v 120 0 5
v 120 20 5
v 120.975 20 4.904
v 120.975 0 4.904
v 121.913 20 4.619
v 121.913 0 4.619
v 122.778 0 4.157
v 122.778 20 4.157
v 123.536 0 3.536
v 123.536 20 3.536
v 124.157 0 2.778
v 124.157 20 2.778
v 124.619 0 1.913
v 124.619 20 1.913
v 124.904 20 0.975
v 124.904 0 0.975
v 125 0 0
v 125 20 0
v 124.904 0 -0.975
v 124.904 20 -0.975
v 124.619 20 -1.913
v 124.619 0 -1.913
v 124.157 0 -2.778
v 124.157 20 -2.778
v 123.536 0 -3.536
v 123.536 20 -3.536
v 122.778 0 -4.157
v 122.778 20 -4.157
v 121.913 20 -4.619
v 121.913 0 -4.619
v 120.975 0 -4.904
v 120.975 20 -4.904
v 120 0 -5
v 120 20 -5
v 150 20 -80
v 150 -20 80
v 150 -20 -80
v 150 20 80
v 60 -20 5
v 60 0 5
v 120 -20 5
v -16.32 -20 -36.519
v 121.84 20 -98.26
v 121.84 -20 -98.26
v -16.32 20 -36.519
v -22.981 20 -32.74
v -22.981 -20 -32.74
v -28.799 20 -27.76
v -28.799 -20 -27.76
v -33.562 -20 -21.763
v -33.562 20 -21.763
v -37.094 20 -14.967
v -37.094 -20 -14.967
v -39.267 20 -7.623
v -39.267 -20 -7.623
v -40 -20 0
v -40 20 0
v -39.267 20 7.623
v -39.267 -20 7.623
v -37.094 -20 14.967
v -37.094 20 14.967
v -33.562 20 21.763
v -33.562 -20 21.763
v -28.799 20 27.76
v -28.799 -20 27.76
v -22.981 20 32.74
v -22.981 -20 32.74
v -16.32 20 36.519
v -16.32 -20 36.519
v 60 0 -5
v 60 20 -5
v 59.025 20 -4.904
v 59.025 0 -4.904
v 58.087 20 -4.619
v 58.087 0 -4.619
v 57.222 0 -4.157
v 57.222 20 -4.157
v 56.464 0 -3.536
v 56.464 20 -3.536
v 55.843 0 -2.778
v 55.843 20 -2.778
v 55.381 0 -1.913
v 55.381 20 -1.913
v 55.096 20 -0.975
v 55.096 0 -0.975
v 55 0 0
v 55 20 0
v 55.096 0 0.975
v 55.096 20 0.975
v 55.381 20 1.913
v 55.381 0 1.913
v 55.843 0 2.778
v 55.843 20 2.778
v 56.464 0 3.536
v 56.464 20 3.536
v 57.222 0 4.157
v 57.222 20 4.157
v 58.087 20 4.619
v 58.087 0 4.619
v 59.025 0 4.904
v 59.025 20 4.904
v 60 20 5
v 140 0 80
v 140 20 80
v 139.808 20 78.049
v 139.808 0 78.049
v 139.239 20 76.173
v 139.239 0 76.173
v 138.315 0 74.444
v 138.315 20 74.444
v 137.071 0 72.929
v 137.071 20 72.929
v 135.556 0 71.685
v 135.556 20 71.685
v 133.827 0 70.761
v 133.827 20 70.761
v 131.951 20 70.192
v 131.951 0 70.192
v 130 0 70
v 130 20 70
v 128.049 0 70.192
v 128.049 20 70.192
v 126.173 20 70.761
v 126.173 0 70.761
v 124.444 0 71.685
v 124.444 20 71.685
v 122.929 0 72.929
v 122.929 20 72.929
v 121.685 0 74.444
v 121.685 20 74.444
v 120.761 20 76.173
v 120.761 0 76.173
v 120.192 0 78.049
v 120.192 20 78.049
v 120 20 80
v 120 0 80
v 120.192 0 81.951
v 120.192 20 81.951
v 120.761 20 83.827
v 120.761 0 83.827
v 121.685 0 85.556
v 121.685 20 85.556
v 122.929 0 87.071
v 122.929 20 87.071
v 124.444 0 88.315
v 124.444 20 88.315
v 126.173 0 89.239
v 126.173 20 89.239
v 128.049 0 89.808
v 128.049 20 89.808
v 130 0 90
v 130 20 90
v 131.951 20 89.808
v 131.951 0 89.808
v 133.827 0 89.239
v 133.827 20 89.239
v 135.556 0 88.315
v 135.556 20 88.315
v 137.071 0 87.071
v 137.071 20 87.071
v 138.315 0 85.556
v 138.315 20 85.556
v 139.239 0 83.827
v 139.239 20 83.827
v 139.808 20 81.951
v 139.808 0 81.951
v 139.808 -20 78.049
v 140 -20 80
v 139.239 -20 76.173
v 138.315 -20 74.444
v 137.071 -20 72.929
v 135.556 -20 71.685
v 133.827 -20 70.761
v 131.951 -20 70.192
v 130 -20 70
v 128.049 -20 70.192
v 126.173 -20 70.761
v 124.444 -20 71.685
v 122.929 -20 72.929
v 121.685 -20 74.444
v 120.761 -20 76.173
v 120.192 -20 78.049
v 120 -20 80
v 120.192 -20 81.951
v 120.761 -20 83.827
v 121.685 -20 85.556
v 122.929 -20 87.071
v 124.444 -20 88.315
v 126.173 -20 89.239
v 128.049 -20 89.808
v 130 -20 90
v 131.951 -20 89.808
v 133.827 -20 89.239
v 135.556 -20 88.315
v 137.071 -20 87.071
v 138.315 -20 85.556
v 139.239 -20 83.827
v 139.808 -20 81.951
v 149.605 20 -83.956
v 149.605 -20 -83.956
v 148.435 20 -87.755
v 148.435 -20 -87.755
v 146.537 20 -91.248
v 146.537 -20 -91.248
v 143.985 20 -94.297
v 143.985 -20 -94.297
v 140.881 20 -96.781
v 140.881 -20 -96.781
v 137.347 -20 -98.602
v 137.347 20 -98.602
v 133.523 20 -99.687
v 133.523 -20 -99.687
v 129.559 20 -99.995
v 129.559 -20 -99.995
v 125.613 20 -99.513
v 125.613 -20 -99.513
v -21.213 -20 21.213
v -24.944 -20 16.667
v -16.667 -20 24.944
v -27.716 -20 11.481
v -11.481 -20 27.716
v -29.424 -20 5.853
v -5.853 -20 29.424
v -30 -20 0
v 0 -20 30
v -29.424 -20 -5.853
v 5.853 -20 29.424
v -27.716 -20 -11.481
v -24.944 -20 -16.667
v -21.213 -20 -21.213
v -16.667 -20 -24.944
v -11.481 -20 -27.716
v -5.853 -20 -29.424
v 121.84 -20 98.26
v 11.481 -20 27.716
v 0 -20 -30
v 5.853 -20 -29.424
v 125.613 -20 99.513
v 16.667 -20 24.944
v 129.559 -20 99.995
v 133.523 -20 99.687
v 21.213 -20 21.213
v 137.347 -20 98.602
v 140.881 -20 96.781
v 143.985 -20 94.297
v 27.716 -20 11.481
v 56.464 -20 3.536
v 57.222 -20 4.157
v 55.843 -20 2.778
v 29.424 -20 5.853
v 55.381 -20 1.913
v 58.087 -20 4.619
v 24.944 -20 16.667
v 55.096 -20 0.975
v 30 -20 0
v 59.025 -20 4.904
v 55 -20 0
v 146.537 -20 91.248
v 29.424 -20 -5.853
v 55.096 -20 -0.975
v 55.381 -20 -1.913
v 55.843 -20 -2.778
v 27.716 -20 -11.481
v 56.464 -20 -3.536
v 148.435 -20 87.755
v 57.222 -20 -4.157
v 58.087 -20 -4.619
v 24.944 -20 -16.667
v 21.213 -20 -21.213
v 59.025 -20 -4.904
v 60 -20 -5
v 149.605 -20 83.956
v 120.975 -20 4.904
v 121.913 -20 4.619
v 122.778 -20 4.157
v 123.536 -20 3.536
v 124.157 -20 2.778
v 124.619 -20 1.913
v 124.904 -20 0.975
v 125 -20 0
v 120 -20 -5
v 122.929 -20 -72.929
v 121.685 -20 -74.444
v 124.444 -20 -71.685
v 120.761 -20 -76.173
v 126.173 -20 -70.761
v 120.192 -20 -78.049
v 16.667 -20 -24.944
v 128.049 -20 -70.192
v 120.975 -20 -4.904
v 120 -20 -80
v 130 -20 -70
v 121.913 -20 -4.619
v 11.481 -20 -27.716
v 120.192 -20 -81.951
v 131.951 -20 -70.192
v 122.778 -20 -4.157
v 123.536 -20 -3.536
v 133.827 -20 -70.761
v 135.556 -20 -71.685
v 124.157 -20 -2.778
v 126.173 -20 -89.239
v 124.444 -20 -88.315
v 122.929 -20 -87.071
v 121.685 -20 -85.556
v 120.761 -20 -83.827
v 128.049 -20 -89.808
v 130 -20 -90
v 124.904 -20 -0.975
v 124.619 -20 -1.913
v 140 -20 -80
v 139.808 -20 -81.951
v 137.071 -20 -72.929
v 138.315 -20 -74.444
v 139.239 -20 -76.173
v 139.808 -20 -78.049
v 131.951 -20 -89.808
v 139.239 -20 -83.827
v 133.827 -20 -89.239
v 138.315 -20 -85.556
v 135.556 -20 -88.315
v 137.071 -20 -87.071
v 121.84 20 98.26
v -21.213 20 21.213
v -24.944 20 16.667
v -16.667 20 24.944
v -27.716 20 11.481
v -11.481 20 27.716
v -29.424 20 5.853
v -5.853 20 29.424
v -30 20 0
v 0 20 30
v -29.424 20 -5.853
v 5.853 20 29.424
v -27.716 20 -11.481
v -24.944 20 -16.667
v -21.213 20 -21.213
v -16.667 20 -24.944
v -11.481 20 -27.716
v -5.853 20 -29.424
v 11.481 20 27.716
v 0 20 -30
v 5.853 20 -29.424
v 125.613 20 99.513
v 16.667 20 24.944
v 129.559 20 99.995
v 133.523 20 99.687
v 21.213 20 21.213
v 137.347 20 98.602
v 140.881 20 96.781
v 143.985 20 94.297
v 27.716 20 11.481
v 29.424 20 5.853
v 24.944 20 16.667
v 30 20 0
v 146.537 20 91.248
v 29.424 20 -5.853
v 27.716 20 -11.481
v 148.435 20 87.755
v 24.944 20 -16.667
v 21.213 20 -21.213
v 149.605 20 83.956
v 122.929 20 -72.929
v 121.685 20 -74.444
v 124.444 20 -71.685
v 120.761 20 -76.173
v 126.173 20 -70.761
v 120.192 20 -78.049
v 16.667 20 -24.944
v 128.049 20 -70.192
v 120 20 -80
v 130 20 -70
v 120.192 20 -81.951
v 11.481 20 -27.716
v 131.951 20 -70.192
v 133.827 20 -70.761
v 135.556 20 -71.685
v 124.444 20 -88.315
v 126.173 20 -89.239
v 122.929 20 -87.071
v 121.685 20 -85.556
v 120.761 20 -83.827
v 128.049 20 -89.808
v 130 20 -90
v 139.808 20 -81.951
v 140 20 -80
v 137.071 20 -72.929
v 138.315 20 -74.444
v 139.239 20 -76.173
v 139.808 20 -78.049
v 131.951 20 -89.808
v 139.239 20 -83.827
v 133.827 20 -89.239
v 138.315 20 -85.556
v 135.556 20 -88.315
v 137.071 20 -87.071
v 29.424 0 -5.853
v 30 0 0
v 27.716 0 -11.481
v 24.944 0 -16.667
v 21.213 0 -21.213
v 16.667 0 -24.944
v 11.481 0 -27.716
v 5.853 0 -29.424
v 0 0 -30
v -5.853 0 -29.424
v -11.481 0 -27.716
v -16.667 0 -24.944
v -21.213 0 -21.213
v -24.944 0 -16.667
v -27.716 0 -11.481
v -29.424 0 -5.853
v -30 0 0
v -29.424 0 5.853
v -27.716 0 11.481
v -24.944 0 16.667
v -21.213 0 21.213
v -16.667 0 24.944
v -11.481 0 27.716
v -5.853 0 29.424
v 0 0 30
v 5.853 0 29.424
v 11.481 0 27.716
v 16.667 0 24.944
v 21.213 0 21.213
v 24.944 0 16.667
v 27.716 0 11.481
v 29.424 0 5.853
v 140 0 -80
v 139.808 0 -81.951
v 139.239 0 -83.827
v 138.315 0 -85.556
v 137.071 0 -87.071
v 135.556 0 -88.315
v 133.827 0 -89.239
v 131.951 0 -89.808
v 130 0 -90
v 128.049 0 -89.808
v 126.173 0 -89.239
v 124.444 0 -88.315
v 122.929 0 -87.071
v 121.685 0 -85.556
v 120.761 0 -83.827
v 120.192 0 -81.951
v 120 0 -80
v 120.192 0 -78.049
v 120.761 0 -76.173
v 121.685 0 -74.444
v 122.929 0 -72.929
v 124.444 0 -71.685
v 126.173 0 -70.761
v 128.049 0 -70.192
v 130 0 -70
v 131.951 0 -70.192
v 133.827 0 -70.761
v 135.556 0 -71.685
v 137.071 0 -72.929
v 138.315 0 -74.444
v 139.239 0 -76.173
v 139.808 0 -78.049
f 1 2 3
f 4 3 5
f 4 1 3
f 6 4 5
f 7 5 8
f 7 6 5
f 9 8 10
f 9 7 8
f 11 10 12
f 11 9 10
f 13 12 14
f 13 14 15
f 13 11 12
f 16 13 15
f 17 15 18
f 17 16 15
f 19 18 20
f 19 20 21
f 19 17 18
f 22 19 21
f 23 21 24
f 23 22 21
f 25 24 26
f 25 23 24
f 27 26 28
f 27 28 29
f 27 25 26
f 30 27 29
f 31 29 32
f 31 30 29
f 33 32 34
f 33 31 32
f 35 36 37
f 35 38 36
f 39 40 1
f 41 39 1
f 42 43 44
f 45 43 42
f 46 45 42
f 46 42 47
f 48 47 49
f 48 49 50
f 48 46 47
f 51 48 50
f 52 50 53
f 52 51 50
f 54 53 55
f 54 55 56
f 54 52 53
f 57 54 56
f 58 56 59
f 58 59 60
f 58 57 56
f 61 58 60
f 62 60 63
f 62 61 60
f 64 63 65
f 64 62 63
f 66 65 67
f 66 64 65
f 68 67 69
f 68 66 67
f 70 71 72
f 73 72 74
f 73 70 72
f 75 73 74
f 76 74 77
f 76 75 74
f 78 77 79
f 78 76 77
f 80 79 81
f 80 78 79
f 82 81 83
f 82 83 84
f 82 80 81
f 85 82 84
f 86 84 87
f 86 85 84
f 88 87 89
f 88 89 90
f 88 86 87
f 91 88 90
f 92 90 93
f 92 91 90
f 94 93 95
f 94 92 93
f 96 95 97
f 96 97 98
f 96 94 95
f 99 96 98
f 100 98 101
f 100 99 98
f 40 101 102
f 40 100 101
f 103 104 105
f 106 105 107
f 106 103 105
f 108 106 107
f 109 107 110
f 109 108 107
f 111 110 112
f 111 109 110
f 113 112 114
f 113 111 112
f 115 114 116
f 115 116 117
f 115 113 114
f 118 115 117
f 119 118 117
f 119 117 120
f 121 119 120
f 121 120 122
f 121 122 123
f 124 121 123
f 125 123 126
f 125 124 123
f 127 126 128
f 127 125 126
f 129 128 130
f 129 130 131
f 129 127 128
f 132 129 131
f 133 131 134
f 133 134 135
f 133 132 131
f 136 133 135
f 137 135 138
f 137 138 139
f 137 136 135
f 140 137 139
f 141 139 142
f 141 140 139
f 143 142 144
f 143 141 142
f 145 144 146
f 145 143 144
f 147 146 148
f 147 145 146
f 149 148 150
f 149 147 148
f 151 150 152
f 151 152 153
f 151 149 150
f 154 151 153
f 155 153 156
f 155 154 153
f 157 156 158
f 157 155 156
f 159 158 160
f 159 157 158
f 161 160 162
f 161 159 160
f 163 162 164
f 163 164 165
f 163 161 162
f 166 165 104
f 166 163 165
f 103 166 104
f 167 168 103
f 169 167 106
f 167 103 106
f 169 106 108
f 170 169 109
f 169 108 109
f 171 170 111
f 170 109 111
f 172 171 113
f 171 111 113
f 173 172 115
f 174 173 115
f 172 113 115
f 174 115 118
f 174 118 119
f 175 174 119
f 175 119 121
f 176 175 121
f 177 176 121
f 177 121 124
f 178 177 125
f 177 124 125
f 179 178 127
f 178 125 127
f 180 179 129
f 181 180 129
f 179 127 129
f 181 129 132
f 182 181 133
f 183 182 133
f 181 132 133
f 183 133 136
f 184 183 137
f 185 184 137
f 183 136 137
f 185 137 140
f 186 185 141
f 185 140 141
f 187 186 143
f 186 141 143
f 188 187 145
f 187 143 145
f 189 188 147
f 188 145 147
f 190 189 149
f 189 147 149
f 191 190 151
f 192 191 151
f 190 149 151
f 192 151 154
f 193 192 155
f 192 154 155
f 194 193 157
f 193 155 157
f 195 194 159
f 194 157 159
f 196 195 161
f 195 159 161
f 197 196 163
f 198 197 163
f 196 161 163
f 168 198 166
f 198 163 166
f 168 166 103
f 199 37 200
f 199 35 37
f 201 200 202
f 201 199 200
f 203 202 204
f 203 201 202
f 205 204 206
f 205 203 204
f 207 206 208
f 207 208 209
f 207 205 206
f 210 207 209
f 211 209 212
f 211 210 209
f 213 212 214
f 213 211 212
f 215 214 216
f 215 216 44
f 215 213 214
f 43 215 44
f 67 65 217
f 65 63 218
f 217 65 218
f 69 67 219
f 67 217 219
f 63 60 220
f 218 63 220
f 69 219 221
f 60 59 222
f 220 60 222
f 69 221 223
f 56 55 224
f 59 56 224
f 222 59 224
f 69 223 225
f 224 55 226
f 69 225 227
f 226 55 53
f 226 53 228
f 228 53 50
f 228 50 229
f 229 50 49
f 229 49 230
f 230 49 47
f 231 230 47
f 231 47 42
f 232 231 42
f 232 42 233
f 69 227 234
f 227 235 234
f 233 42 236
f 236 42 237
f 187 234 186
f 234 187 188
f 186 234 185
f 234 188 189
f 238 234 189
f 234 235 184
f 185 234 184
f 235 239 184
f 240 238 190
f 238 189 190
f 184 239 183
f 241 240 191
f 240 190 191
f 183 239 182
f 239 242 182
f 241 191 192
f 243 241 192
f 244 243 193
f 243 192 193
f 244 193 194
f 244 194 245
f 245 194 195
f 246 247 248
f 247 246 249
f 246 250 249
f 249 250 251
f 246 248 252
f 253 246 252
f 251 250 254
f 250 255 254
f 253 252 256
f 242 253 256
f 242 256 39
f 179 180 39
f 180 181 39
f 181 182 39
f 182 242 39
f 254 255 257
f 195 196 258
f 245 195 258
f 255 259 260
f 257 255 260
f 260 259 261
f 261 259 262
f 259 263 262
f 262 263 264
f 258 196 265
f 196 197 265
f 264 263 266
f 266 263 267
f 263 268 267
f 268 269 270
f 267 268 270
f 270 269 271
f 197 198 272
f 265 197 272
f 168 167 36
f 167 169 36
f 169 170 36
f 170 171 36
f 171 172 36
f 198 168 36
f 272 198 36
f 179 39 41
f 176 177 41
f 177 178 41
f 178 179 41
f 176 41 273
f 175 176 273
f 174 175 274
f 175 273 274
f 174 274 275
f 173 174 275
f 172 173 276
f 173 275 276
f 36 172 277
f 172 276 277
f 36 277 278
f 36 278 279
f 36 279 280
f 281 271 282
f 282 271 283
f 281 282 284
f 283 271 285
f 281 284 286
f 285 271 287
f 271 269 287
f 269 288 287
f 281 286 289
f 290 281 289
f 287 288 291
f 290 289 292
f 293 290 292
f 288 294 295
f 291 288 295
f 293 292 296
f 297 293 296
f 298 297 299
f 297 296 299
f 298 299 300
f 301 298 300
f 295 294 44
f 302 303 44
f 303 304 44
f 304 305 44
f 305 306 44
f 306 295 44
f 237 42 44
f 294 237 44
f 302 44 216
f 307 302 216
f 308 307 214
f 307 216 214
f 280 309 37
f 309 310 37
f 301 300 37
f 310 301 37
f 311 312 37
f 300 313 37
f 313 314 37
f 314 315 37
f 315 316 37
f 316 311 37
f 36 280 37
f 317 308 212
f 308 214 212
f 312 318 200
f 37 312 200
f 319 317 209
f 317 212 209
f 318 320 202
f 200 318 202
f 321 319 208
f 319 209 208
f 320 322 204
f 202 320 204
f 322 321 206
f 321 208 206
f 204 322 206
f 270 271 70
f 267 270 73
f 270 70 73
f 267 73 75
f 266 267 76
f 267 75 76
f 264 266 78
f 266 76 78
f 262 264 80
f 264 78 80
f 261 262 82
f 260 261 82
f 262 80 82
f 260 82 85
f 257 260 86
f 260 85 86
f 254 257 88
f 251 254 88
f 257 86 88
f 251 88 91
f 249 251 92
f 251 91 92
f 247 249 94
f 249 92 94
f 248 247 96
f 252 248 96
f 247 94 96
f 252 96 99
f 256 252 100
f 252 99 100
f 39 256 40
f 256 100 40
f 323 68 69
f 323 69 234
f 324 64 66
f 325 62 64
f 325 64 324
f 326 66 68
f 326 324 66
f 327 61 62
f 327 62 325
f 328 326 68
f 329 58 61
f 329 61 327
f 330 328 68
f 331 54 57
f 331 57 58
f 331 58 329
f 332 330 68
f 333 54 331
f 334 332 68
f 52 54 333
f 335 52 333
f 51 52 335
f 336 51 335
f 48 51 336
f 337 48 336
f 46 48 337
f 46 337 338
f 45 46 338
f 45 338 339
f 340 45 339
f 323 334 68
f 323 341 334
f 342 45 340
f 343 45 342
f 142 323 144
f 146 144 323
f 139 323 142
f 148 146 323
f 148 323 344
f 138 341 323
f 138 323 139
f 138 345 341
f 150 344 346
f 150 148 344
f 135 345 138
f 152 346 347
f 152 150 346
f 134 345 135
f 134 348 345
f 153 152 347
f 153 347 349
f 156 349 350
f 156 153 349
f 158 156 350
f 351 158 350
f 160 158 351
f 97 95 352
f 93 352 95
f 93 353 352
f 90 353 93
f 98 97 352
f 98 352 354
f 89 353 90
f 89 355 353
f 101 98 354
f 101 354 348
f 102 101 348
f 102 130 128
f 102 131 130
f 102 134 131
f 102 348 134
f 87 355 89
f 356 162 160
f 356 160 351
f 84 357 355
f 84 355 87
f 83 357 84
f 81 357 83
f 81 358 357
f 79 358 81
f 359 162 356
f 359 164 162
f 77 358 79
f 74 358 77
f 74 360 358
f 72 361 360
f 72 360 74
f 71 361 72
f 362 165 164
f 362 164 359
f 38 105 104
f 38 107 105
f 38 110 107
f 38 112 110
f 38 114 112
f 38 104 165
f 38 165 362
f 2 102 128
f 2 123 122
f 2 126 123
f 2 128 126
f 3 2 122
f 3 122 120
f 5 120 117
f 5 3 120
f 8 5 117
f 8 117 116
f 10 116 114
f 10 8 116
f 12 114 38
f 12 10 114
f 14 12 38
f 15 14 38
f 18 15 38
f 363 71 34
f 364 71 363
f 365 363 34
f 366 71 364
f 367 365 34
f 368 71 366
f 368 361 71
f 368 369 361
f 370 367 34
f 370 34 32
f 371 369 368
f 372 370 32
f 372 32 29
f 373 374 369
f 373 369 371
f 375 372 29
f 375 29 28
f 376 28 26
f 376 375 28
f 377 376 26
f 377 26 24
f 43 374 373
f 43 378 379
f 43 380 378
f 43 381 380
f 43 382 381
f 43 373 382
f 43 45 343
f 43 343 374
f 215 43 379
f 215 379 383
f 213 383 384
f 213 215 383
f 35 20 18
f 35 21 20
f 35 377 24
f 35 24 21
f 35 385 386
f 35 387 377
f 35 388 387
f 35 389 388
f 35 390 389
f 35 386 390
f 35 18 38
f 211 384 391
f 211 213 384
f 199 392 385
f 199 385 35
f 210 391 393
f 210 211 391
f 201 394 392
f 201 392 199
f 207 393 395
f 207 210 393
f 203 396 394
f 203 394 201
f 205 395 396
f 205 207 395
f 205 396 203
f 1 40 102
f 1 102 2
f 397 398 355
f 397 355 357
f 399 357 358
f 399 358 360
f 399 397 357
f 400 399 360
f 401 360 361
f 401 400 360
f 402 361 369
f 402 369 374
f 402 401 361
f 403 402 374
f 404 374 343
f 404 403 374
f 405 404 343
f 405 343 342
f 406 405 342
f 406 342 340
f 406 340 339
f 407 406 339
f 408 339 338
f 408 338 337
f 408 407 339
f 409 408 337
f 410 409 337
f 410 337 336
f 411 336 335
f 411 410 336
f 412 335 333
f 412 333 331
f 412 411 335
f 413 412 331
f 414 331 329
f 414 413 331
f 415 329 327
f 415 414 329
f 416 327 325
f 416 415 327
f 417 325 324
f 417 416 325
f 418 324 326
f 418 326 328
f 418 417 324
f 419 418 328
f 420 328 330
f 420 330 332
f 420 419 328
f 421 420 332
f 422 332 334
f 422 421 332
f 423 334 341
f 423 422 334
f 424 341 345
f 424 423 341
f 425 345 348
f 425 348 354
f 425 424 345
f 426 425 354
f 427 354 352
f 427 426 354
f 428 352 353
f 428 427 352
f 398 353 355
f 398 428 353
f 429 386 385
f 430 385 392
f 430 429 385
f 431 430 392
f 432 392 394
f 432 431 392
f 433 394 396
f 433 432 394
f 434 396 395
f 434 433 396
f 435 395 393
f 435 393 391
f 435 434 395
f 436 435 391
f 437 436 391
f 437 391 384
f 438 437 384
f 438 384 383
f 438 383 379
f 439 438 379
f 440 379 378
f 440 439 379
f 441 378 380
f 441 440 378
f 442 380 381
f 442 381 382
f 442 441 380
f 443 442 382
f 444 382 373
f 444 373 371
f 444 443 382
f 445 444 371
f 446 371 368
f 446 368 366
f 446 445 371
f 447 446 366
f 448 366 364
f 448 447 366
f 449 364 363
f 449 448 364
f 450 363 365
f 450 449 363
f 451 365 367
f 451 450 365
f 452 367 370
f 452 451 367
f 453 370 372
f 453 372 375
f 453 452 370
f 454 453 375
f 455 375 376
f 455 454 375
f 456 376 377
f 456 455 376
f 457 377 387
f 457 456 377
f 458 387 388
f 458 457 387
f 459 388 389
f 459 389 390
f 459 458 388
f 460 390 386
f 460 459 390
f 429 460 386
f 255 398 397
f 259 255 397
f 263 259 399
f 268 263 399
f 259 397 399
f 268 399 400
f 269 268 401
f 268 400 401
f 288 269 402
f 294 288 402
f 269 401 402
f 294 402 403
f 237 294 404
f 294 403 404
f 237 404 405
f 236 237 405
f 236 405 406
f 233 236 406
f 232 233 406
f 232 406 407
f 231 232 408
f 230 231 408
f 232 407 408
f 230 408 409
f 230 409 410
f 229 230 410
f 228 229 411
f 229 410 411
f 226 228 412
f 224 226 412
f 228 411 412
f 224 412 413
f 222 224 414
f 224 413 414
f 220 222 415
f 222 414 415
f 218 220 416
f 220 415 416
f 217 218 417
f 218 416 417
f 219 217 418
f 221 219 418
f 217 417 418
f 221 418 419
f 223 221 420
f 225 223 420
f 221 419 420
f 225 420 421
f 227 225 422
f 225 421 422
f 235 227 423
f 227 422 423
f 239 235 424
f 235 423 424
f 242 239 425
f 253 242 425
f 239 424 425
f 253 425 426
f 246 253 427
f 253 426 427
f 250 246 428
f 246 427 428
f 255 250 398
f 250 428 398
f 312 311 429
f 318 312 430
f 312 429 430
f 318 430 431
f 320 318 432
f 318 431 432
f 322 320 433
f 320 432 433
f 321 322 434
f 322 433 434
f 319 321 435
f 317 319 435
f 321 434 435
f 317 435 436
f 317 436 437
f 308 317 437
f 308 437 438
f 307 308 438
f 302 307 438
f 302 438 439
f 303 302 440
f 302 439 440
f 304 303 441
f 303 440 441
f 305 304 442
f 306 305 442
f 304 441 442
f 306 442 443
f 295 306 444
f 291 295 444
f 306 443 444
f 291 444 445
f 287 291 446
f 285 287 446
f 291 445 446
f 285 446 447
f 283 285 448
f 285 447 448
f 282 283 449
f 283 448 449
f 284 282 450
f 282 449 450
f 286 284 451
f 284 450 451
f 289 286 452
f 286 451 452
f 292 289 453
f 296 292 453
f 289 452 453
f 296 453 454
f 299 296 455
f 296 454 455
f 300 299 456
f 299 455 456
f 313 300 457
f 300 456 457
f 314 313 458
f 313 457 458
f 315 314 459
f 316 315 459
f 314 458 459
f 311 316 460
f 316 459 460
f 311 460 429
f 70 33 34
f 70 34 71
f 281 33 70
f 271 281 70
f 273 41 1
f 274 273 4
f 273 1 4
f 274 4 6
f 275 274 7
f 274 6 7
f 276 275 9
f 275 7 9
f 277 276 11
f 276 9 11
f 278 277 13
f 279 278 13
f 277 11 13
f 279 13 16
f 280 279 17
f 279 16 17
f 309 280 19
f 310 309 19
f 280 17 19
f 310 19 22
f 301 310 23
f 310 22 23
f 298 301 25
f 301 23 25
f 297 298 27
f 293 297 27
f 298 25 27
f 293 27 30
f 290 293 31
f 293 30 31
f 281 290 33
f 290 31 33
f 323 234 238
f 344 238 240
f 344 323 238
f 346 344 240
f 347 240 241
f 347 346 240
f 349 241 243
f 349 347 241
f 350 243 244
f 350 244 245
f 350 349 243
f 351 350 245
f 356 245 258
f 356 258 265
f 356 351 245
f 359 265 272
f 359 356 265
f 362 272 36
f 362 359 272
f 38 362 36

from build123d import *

# Parameters (mm, degrees)
BOSS_EXTRUDE1_DEPTH      = 20
BOSS_EXTRUDE1_DEPTH_BACK = 20
SKETCH1_R                = 30
SKETCH1_R_2              = 10


with BuildPart() as part:
    # Sketch1 → Boss-Extrude1 (new, two sides: drawn at the far end of the back side and taken through both)
    with BuildSketch(Plane(origin=(0, 0, 0), x_dir=(1, 0, 0), z_dir=(0, 1, 0)).offset(-BOSS_EXTRUDE1_DEPTH_BACK)):
        with BuildLine():
            Line((121.840174455, 98.259716511), (-16.319651091, 36.519433022))
            ThreePointArc((-16.319651091, 36.519433022), (-40, 0), (-16.319651091, -36.519433022))
            Line((-16.319651091, -36.519433022), (121.840174455, -98.259716511))
            ThreePointArc((121.840174455, -98.259716511), (140.88125657, -96.780889591), (150, -80))
            Line((150, -80), (150, 80))
            ThreePointArc((150, 80), (140.88125657, 96.780889591), (121.840174455, 98.259716511))
        make_face()
        Circle(SKETCH1_R, mode=Mode.SUBTRACT)
        with Locations((130, 80)):
            Circle(SKETCH1_R_2, mode=Mode.SUBTRACT)
        with Locations((130, -80)):
            Circle(SKETCH1_R_2, mode=Mode.SUBTRACT)
        with BuildLine():
            Line((60, -5), (120, -5))
            ThreePointArc((120, -5), (125, 0), (120, 5))
            Line((120, 5), (60, 5))
            ThreePointArc((60, 5), (55, 0), (60, -5))
        make_face(mode=Mode.SUBTRACT)
    extrude(amount=BOSS_EXTRUDE1_DEPTH + BOSS_EXTRUDE1_DEPTH_BACK)


solid = part.part
